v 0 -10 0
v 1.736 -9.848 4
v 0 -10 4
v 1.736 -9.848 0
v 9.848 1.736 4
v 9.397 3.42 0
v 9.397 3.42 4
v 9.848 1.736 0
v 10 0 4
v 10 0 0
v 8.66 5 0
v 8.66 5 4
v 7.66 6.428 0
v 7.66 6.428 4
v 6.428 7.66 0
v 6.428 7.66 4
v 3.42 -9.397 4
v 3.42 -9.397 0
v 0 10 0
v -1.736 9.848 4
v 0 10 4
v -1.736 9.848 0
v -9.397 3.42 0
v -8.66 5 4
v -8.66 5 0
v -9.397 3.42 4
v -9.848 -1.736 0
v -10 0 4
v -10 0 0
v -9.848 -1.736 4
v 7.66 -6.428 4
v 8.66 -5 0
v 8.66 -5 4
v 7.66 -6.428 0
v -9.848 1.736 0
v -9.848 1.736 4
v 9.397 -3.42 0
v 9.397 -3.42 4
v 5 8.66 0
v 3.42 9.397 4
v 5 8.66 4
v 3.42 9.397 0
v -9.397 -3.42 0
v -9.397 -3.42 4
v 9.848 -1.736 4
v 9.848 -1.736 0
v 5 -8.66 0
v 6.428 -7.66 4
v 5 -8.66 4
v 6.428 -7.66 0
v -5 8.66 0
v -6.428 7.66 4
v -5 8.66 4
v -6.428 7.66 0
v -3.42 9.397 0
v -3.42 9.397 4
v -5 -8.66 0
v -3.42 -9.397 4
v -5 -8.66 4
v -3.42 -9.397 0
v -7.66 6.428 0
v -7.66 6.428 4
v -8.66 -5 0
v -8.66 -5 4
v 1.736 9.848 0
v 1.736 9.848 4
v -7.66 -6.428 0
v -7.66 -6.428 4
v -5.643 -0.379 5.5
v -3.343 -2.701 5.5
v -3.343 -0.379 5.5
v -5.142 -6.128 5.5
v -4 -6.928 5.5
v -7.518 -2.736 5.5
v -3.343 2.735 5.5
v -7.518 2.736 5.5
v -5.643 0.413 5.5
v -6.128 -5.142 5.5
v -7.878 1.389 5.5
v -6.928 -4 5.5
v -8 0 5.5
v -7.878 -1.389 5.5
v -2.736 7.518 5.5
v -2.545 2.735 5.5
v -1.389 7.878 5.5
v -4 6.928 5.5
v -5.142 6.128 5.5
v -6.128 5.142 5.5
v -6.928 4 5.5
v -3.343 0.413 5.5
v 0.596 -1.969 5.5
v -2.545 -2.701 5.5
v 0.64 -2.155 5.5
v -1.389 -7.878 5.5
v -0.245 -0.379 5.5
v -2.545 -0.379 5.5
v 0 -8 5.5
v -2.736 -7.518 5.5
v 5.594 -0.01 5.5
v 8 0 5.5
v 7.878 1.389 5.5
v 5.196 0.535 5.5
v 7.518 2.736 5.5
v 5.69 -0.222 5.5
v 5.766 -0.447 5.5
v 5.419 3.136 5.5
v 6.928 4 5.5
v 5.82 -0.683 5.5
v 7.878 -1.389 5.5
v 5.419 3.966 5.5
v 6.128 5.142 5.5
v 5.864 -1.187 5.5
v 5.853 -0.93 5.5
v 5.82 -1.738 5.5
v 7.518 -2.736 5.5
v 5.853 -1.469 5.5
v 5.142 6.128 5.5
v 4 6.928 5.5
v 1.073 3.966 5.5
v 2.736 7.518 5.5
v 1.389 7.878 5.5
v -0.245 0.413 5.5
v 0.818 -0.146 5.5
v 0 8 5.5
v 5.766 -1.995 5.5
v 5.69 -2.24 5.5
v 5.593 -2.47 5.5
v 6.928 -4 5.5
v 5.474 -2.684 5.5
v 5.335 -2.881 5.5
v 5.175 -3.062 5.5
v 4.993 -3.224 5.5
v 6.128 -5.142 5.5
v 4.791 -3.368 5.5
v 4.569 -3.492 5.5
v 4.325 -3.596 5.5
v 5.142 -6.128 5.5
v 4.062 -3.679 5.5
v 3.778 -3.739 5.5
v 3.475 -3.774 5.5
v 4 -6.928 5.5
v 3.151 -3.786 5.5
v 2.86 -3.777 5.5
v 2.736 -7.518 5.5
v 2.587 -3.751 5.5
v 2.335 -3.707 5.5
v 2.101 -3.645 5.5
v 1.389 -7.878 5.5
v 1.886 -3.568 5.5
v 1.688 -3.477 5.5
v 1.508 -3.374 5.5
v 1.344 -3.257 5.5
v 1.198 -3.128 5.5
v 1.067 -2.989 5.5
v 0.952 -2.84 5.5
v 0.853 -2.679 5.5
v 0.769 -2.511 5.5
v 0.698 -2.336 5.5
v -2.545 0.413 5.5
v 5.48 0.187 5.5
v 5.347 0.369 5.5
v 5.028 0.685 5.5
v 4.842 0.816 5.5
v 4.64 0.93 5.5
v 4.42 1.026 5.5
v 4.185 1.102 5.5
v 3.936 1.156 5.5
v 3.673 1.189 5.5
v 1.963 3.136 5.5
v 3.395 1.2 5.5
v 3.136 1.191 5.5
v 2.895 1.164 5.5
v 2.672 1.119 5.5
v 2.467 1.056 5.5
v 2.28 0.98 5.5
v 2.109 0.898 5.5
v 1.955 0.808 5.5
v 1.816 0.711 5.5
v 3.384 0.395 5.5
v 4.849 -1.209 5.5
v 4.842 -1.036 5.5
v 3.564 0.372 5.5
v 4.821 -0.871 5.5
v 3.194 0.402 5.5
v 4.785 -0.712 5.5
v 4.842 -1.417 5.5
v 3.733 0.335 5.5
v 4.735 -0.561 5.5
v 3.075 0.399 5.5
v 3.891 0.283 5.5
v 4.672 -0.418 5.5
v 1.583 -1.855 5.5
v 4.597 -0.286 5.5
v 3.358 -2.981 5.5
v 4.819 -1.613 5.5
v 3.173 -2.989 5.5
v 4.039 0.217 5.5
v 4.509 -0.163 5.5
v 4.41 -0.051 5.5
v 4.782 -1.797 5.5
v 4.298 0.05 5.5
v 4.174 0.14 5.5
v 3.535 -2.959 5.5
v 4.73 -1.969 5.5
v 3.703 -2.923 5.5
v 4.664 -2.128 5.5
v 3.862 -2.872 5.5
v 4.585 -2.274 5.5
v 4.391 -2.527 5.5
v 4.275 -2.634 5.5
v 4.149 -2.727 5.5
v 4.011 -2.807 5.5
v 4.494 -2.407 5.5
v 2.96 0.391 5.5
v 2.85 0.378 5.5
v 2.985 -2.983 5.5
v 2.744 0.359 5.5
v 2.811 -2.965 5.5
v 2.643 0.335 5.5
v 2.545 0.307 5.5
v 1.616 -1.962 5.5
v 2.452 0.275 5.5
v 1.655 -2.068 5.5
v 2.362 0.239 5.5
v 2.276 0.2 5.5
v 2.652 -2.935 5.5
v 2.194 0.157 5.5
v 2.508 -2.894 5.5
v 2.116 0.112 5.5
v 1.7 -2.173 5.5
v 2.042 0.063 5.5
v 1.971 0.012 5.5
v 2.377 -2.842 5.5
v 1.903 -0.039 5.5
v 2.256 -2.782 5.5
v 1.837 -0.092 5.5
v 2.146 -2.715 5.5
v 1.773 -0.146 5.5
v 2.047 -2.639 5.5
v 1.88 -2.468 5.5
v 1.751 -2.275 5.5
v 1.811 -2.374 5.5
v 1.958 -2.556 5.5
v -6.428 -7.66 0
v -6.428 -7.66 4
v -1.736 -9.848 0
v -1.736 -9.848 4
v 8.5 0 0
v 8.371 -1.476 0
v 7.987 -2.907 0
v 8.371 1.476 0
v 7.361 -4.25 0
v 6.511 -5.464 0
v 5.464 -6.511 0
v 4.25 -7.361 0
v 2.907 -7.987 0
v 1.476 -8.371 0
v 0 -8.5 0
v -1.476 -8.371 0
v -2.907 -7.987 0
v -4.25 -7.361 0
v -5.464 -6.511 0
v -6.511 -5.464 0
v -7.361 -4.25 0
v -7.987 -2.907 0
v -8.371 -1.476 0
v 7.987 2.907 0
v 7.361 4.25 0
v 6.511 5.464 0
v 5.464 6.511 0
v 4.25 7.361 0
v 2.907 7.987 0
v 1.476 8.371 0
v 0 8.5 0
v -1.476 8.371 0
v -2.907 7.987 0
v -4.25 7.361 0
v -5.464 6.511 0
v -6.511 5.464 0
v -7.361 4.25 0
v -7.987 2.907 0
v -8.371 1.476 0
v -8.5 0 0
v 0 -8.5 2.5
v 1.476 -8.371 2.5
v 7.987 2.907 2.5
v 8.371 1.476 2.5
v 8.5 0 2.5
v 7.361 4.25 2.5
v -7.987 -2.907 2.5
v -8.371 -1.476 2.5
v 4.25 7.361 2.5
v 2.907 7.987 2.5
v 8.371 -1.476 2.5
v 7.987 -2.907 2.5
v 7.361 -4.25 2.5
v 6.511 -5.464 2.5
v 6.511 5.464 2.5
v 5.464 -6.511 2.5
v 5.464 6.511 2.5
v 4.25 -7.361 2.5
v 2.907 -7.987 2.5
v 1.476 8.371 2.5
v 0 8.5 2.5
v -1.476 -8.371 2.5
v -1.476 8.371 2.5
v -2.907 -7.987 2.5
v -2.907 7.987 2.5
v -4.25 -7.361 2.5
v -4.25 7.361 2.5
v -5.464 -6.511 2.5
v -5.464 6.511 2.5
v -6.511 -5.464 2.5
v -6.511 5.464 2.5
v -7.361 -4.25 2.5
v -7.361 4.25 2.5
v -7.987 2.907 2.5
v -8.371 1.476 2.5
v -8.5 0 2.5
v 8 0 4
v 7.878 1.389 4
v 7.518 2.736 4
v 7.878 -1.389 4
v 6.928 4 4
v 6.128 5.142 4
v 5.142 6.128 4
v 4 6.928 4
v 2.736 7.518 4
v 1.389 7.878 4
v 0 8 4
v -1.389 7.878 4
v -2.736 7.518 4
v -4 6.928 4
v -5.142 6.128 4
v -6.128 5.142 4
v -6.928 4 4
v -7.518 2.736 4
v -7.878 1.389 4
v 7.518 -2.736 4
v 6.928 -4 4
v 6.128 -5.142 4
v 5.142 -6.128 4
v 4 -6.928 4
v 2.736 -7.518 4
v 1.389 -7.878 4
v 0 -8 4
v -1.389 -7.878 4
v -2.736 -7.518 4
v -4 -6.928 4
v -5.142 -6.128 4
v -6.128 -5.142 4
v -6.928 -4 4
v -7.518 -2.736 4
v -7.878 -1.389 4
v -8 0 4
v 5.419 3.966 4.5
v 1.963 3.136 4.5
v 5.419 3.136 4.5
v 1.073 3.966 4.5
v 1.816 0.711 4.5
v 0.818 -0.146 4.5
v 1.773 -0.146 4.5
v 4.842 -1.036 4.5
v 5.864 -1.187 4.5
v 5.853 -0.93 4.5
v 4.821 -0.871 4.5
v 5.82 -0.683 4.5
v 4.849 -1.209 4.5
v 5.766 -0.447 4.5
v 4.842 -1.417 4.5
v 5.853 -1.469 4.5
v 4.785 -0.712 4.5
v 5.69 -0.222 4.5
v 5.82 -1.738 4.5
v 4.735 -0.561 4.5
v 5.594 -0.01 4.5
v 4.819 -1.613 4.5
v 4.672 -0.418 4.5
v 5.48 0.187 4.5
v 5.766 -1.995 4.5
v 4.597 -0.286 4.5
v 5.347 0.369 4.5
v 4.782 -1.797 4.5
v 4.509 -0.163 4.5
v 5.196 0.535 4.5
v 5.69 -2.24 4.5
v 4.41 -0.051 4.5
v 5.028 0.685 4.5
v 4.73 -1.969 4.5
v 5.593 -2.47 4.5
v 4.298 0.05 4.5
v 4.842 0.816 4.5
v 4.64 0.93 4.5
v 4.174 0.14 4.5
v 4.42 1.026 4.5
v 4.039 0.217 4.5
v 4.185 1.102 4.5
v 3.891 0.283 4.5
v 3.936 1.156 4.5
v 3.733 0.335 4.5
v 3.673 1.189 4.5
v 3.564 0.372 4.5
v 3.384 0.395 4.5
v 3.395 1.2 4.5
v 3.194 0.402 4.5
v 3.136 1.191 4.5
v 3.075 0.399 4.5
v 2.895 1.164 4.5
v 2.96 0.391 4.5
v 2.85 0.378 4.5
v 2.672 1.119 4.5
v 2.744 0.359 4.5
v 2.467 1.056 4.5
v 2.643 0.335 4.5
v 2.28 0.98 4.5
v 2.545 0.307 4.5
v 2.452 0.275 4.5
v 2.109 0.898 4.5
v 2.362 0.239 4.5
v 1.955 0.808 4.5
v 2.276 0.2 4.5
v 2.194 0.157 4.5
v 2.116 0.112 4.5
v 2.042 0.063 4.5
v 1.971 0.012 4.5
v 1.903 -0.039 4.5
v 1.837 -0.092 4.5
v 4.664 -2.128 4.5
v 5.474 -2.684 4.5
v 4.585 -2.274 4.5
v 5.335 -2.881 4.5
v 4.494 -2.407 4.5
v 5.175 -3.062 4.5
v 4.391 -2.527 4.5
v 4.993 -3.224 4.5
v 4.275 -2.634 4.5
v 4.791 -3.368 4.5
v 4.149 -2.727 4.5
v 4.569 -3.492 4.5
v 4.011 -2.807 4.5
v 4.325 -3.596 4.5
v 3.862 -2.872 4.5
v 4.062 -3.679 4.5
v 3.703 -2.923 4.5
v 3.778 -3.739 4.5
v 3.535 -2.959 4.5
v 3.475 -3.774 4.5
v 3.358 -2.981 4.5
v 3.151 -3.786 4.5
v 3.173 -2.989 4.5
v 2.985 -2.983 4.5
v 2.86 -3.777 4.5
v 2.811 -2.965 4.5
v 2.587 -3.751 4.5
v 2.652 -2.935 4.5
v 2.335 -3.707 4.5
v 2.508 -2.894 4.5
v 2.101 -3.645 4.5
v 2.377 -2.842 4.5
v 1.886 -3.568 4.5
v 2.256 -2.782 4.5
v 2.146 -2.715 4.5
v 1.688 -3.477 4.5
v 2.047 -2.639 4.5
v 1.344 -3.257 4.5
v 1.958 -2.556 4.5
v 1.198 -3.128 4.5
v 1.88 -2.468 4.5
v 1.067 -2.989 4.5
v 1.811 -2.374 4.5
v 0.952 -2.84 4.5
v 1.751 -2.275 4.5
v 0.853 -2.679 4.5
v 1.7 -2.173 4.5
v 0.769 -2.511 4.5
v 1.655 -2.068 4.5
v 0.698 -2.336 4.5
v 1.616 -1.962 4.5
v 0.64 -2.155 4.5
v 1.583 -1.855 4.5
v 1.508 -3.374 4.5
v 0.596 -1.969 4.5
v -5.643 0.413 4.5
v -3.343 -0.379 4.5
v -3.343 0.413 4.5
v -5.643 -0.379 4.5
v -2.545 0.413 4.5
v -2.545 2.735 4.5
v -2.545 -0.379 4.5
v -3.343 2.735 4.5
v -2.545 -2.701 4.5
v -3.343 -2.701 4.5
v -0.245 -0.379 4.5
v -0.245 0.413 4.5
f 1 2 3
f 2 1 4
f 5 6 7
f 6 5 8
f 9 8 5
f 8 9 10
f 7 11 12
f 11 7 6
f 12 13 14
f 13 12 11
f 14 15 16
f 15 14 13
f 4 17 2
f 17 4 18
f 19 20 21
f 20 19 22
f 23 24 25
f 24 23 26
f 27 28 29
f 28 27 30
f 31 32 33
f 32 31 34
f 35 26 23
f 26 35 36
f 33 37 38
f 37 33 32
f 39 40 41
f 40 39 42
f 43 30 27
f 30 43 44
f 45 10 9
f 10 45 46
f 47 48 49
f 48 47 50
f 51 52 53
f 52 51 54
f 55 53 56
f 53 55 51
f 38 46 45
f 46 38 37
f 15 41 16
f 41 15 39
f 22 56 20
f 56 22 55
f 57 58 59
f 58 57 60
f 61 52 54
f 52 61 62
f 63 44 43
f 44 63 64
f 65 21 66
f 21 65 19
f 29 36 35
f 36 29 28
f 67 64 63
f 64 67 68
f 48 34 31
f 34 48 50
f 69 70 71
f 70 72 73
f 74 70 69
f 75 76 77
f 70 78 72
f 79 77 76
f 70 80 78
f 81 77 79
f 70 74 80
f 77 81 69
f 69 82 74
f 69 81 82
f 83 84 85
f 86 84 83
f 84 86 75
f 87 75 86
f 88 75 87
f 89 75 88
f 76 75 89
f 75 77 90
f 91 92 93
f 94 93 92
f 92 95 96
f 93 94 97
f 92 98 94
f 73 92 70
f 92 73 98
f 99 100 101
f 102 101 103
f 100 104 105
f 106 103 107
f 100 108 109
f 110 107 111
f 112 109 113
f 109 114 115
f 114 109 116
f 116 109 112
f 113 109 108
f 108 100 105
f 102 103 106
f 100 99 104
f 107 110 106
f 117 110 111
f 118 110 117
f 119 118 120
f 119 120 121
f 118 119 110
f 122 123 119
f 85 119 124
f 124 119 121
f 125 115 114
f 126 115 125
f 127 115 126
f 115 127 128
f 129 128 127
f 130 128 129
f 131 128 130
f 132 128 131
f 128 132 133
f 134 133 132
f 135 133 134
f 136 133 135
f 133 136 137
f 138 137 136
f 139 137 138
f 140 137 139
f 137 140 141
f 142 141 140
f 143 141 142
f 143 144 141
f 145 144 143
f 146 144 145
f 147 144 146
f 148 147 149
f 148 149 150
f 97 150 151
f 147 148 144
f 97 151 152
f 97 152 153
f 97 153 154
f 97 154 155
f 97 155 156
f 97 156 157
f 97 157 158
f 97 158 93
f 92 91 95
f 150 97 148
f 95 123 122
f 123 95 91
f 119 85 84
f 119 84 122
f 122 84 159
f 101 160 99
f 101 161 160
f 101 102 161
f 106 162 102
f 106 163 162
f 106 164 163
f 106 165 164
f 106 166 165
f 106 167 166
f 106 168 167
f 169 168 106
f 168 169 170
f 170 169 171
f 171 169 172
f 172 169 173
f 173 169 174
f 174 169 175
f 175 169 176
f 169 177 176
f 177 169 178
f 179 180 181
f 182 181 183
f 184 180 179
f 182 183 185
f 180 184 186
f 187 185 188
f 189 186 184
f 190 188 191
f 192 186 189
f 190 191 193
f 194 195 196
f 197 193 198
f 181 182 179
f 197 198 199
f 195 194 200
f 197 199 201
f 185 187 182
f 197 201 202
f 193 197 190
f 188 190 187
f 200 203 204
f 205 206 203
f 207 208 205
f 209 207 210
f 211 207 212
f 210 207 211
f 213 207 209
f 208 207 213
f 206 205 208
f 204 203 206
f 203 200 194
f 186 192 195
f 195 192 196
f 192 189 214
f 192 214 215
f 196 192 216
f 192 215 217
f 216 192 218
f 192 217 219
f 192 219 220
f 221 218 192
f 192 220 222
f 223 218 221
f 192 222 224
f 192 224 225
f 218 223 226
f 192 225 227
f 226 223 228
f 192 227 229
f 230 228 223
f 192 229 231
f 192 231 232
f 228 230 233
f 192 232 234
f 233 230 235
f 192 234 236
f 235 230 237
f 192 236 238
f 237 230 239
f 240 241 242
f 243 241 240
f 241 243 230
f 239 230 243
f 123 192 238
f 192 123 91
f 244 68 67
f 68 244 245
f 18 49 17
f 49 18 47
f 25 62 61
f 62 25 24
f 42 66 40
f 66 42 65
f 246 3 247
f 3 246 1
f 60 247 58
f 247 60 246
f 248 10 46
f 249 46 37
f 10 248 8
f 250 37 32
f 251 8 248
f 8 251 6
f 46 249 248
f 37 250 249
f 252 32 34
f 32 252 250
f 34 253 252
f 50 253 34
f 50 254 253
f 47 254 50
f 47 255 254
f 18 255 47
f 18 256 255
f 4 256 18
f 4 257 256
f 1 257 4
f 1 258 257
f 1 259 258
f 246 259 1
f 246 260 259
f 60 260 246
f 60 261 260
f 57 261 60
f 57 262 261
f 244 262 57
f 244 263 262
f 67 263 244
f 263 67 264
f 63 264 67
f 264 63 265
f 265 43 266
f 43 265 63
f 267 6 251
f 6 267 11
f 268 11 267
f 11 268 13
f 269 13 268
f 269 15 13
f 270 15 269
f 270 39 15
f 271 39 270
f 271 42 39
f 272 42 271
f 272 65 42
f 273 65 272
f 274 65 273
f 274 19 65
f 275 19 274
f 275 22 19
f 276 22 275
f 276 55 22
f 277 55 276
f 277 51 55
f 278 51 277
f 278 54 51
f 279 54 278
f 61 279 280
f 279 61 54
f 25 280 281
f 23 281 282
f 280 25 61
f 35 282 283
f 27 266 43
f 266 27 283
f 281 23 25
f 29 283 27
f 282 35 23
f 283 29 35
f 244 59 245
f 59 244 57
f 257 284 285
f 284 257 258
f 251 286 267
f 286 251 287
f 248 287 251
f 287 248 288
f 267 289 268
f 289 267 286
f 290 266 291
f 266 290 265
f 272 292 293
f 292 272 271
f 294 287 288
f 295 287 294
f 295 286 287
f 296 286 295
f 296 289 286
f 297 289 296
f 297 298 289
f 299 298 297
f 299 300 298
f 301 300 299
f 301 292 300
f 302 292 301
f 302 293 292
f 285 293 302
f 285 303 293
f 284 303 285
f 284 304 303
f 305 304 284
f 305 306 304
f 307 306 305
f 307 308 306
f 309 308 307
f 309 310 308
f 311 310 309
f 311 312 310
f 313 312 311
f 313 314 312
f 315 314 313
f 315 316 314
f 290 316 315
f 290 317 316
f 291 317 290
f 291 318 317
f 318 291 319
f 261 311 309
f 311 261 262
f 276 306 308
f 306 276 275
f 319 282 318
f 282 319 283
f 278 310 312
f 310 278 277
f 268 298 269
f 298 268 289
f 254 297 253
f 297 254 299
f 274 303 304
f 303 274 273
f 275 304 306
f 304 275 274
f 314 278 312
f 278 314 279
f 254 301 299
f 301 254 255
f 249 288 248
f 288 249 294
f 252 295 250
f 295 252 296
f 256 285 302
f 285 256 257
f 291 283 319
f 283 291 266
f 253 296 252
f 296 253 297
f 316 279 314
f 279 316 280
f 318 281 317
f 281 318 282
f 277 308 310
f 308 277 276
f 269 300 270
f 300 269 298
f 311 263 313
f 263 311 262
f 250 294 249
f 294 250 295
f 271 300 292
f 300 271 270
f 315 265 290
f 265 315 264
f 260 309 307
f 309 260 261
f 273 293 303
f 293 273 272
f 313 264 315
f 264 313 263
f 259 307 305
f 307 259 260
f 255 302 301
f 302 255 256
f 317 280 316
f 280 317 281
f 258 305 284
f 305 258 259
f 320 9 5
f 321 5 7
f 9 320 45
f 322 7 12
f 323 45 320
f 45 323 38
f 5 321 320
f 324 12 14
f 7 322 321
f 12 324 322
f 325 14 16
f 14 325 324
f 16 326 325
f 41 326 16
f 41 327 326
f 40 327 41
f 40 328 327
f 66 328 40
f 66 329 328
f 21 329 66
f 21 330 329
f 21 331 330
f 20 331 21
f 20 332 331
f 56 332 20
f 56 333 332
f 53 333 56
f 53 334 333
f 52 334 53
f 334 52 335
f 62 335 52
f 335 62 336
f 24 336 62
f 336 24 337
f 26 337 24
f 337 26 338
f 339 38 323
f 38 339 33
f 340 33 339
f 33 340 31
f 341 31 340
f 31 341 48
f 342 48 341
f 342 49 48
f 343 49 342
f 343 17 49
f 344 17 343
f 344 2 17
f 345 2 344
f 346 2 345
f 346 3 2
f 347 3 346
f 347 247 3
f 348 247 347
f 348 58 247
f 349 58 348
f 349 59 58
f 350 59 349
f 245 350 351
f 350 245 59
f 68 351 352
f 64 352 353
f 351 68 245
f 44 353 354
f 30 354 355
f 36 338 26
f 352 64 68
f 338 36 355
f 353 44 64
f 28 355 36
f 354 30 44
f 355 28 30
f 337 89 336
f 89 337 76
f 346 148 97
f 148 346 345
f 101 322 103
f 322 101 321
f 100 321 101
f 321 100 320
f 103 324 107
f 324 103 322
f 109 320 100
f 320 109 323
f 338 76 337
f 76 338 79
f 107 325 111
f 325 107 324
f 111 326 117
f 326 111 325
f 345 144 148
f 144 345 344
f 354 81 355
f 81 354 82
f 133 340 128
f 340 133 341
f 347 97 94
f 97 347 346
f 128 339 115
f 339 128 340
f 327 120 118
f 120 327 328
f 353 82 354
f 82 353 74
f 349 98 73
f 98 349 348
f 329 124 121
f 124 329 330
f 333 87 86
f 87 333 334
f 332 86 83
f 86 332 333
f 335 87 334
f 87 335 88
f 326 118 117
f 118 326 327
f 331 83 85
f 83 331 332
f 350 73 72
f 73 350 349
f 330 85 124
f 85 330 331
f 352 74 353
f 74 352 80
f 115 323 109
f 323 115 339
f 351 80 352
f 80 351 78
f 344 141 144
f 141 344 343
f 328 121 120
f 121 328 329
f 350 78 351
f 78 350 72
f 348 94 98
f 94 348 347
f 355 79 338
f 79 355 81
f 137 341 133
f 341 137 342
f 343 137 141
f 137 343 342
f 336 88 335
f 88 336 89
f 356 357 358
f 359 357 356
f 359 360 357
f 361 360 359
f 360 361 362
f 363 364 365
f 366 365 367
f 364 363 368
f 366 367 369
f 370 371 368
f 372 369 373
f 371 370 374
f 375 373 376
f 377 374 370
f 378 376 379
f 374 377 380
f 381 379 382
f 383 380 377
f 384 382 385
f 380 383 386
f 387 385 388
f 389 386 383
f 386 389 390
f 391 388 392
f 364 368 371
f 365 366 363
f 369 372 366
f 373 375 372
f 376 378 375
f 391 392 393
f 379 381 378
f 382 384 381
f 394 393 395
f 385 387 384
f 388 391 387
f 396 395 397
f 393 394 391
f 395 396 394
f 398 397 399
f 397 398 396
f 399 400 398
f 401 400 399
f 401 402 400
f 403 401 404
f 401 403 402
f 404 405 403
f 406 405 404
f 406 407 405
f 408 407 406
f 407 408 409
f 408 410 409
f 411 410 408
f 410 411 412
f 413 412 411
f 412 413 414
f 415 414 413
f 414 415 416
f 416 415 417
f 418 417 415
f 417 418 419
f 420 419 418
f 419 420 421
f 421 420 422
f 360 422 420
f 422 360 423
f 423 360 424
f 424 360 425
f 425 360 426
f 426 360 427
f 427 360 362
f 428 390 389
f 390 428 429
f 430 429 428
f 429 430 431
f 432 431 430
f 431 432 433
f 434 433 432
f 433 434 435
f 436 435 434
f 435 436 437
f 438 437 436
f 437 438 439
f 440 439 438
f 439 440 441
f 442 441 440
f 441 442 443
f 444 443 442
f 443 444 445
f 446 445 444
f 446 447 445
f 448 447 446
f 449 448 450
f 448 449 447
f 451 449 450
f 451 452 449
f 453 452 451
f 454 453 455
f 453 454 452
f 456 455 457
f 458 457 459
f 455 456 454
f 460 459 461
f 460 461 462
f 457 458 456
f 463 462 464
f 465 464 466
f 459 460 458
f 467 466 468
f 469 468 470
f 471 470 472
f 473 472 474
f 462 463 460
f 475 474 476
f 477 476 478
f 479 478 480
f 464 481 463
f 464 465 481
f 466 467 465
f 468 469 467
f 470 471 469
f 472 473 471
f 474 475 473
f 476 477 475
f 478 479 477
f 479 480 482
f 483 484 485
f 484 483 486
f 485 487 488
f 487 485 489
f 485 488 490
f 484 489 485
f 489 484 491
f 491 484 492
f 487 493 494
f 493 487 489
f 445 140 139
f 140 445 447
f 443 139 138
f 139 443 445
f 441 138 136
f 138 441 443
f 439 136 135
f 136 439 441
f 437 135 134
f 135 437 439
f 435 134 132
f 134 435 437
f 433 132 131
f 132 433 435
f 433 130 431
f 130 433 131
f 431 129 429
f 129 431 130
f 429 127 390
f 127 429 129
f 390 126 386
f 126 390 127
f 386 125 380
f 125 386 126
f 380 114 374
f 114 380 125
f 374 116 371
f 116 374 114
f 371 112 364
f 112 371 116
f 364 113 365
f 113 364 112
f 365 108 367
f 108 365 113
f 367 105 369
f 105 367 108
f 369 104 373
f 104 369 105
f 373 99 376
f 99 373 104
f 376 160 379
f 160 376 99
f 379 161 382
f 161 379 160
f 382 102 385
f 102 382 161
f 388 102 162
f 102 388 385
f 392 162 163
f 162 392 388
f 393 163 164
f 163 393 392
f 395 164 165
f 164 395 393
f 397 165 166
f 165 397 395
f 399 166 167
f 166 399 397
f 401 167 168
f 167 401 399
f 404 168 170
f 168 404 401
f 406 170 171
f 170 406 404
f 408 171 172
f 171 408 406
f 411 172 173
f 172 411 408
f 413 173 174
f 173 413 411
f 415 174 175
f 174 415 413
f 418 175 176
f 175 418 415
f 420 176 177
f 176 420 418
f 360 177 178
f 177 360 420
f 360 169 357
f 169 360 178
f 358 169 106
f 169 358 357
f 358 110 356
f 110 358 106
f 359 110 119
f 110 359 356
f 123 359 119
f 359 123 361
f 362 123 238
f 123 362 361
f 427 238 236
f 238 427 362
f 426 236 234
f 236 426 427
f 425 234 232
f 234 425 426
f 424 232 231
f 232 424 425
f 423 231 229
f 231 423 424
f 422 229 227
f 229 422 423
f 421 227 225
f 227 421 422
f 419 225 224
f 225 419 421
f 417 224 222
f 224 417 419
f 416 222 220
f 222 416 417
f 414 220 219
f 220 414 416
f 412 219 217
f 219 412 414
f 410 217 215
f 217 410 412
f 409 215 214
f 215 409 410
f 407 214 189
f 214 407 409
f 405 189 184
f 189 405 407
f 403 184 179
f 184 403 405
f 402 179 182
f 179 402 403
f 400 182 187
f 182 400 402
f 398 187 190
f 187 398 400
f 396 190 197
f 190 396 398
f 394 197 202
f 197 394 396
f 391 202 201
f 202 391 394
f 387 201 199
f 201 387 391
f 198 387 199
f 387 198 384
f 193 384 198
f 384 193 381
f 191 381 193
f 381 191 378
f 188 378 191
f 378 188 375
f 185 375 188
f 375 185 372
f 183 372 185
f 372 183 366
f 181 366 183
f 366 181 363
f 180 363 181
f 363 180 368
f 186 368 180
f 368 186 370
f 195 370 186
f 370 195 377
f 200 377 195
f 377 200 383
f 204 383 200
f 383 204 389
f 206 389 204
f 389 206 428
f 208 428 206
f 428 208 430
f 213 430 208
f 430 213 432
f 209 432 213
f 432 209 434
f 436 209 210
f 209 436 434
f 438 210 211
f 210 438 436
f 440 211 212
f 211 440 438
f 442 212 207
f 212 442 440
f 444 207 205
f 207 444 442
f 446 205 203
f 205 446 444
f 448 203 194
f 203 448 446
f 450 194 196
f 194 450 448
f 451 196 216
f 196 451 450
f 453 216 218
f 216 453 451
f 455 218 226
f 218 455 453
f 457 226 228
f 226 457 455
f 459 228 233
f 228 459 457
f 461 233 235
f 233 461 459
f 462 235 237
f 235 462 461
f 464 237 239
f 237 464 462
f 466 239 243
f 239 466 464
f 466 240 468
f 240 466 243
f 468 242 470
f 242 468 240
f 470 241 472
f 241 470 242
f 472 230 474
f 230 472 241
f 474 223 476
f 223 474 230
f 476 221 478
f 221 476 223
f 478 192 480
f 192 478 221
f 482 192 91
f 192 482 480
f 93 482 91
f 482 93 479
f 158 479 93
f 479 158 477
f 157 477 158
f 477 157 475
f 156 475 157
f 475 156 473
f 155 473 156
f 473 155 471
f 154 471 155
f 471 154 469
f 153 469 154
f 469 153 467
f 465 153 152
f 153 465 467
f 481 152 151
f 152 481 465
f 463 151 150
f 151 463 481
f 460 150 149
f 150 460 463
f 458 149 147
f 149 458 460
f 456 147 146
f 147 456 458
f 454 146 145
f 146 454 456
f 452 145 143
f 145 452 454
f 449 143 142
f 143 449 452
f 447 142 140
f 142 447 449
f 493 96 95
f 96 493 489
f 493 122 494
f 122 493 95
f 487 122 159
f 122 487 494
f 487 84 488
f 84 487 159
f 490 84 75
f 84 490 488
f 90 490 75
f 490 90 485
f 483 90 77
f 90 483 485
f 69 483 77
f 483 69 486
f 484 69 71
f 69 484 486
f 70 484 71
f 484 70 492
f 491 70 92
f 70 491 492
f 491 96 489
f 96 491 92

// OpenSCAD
difference() {
	difference() {
		difference() {
			cylinder($fn = 36, h = 5.5000000000, r = 10);
			translate(v = [0, 0, -1]) {
				cylinder($fn = 36, h = 3.5000000000, r = 8.5000000000);
			}
		}
		translate(v = [0, 0, 4]) {
			difference() {
				cylinder($fn = 36, h = 3, r = 10.5000000000);
				cylinder($fn = 36, h = 3, r = 8);
			}
		}
	}
	translate(v = [0, 0, 4.5000000000]) {
		linear_extrude(height = 3) {
			text(halign = "center", size = 8, text = "+5", valign = "center");
		}
	}
}
